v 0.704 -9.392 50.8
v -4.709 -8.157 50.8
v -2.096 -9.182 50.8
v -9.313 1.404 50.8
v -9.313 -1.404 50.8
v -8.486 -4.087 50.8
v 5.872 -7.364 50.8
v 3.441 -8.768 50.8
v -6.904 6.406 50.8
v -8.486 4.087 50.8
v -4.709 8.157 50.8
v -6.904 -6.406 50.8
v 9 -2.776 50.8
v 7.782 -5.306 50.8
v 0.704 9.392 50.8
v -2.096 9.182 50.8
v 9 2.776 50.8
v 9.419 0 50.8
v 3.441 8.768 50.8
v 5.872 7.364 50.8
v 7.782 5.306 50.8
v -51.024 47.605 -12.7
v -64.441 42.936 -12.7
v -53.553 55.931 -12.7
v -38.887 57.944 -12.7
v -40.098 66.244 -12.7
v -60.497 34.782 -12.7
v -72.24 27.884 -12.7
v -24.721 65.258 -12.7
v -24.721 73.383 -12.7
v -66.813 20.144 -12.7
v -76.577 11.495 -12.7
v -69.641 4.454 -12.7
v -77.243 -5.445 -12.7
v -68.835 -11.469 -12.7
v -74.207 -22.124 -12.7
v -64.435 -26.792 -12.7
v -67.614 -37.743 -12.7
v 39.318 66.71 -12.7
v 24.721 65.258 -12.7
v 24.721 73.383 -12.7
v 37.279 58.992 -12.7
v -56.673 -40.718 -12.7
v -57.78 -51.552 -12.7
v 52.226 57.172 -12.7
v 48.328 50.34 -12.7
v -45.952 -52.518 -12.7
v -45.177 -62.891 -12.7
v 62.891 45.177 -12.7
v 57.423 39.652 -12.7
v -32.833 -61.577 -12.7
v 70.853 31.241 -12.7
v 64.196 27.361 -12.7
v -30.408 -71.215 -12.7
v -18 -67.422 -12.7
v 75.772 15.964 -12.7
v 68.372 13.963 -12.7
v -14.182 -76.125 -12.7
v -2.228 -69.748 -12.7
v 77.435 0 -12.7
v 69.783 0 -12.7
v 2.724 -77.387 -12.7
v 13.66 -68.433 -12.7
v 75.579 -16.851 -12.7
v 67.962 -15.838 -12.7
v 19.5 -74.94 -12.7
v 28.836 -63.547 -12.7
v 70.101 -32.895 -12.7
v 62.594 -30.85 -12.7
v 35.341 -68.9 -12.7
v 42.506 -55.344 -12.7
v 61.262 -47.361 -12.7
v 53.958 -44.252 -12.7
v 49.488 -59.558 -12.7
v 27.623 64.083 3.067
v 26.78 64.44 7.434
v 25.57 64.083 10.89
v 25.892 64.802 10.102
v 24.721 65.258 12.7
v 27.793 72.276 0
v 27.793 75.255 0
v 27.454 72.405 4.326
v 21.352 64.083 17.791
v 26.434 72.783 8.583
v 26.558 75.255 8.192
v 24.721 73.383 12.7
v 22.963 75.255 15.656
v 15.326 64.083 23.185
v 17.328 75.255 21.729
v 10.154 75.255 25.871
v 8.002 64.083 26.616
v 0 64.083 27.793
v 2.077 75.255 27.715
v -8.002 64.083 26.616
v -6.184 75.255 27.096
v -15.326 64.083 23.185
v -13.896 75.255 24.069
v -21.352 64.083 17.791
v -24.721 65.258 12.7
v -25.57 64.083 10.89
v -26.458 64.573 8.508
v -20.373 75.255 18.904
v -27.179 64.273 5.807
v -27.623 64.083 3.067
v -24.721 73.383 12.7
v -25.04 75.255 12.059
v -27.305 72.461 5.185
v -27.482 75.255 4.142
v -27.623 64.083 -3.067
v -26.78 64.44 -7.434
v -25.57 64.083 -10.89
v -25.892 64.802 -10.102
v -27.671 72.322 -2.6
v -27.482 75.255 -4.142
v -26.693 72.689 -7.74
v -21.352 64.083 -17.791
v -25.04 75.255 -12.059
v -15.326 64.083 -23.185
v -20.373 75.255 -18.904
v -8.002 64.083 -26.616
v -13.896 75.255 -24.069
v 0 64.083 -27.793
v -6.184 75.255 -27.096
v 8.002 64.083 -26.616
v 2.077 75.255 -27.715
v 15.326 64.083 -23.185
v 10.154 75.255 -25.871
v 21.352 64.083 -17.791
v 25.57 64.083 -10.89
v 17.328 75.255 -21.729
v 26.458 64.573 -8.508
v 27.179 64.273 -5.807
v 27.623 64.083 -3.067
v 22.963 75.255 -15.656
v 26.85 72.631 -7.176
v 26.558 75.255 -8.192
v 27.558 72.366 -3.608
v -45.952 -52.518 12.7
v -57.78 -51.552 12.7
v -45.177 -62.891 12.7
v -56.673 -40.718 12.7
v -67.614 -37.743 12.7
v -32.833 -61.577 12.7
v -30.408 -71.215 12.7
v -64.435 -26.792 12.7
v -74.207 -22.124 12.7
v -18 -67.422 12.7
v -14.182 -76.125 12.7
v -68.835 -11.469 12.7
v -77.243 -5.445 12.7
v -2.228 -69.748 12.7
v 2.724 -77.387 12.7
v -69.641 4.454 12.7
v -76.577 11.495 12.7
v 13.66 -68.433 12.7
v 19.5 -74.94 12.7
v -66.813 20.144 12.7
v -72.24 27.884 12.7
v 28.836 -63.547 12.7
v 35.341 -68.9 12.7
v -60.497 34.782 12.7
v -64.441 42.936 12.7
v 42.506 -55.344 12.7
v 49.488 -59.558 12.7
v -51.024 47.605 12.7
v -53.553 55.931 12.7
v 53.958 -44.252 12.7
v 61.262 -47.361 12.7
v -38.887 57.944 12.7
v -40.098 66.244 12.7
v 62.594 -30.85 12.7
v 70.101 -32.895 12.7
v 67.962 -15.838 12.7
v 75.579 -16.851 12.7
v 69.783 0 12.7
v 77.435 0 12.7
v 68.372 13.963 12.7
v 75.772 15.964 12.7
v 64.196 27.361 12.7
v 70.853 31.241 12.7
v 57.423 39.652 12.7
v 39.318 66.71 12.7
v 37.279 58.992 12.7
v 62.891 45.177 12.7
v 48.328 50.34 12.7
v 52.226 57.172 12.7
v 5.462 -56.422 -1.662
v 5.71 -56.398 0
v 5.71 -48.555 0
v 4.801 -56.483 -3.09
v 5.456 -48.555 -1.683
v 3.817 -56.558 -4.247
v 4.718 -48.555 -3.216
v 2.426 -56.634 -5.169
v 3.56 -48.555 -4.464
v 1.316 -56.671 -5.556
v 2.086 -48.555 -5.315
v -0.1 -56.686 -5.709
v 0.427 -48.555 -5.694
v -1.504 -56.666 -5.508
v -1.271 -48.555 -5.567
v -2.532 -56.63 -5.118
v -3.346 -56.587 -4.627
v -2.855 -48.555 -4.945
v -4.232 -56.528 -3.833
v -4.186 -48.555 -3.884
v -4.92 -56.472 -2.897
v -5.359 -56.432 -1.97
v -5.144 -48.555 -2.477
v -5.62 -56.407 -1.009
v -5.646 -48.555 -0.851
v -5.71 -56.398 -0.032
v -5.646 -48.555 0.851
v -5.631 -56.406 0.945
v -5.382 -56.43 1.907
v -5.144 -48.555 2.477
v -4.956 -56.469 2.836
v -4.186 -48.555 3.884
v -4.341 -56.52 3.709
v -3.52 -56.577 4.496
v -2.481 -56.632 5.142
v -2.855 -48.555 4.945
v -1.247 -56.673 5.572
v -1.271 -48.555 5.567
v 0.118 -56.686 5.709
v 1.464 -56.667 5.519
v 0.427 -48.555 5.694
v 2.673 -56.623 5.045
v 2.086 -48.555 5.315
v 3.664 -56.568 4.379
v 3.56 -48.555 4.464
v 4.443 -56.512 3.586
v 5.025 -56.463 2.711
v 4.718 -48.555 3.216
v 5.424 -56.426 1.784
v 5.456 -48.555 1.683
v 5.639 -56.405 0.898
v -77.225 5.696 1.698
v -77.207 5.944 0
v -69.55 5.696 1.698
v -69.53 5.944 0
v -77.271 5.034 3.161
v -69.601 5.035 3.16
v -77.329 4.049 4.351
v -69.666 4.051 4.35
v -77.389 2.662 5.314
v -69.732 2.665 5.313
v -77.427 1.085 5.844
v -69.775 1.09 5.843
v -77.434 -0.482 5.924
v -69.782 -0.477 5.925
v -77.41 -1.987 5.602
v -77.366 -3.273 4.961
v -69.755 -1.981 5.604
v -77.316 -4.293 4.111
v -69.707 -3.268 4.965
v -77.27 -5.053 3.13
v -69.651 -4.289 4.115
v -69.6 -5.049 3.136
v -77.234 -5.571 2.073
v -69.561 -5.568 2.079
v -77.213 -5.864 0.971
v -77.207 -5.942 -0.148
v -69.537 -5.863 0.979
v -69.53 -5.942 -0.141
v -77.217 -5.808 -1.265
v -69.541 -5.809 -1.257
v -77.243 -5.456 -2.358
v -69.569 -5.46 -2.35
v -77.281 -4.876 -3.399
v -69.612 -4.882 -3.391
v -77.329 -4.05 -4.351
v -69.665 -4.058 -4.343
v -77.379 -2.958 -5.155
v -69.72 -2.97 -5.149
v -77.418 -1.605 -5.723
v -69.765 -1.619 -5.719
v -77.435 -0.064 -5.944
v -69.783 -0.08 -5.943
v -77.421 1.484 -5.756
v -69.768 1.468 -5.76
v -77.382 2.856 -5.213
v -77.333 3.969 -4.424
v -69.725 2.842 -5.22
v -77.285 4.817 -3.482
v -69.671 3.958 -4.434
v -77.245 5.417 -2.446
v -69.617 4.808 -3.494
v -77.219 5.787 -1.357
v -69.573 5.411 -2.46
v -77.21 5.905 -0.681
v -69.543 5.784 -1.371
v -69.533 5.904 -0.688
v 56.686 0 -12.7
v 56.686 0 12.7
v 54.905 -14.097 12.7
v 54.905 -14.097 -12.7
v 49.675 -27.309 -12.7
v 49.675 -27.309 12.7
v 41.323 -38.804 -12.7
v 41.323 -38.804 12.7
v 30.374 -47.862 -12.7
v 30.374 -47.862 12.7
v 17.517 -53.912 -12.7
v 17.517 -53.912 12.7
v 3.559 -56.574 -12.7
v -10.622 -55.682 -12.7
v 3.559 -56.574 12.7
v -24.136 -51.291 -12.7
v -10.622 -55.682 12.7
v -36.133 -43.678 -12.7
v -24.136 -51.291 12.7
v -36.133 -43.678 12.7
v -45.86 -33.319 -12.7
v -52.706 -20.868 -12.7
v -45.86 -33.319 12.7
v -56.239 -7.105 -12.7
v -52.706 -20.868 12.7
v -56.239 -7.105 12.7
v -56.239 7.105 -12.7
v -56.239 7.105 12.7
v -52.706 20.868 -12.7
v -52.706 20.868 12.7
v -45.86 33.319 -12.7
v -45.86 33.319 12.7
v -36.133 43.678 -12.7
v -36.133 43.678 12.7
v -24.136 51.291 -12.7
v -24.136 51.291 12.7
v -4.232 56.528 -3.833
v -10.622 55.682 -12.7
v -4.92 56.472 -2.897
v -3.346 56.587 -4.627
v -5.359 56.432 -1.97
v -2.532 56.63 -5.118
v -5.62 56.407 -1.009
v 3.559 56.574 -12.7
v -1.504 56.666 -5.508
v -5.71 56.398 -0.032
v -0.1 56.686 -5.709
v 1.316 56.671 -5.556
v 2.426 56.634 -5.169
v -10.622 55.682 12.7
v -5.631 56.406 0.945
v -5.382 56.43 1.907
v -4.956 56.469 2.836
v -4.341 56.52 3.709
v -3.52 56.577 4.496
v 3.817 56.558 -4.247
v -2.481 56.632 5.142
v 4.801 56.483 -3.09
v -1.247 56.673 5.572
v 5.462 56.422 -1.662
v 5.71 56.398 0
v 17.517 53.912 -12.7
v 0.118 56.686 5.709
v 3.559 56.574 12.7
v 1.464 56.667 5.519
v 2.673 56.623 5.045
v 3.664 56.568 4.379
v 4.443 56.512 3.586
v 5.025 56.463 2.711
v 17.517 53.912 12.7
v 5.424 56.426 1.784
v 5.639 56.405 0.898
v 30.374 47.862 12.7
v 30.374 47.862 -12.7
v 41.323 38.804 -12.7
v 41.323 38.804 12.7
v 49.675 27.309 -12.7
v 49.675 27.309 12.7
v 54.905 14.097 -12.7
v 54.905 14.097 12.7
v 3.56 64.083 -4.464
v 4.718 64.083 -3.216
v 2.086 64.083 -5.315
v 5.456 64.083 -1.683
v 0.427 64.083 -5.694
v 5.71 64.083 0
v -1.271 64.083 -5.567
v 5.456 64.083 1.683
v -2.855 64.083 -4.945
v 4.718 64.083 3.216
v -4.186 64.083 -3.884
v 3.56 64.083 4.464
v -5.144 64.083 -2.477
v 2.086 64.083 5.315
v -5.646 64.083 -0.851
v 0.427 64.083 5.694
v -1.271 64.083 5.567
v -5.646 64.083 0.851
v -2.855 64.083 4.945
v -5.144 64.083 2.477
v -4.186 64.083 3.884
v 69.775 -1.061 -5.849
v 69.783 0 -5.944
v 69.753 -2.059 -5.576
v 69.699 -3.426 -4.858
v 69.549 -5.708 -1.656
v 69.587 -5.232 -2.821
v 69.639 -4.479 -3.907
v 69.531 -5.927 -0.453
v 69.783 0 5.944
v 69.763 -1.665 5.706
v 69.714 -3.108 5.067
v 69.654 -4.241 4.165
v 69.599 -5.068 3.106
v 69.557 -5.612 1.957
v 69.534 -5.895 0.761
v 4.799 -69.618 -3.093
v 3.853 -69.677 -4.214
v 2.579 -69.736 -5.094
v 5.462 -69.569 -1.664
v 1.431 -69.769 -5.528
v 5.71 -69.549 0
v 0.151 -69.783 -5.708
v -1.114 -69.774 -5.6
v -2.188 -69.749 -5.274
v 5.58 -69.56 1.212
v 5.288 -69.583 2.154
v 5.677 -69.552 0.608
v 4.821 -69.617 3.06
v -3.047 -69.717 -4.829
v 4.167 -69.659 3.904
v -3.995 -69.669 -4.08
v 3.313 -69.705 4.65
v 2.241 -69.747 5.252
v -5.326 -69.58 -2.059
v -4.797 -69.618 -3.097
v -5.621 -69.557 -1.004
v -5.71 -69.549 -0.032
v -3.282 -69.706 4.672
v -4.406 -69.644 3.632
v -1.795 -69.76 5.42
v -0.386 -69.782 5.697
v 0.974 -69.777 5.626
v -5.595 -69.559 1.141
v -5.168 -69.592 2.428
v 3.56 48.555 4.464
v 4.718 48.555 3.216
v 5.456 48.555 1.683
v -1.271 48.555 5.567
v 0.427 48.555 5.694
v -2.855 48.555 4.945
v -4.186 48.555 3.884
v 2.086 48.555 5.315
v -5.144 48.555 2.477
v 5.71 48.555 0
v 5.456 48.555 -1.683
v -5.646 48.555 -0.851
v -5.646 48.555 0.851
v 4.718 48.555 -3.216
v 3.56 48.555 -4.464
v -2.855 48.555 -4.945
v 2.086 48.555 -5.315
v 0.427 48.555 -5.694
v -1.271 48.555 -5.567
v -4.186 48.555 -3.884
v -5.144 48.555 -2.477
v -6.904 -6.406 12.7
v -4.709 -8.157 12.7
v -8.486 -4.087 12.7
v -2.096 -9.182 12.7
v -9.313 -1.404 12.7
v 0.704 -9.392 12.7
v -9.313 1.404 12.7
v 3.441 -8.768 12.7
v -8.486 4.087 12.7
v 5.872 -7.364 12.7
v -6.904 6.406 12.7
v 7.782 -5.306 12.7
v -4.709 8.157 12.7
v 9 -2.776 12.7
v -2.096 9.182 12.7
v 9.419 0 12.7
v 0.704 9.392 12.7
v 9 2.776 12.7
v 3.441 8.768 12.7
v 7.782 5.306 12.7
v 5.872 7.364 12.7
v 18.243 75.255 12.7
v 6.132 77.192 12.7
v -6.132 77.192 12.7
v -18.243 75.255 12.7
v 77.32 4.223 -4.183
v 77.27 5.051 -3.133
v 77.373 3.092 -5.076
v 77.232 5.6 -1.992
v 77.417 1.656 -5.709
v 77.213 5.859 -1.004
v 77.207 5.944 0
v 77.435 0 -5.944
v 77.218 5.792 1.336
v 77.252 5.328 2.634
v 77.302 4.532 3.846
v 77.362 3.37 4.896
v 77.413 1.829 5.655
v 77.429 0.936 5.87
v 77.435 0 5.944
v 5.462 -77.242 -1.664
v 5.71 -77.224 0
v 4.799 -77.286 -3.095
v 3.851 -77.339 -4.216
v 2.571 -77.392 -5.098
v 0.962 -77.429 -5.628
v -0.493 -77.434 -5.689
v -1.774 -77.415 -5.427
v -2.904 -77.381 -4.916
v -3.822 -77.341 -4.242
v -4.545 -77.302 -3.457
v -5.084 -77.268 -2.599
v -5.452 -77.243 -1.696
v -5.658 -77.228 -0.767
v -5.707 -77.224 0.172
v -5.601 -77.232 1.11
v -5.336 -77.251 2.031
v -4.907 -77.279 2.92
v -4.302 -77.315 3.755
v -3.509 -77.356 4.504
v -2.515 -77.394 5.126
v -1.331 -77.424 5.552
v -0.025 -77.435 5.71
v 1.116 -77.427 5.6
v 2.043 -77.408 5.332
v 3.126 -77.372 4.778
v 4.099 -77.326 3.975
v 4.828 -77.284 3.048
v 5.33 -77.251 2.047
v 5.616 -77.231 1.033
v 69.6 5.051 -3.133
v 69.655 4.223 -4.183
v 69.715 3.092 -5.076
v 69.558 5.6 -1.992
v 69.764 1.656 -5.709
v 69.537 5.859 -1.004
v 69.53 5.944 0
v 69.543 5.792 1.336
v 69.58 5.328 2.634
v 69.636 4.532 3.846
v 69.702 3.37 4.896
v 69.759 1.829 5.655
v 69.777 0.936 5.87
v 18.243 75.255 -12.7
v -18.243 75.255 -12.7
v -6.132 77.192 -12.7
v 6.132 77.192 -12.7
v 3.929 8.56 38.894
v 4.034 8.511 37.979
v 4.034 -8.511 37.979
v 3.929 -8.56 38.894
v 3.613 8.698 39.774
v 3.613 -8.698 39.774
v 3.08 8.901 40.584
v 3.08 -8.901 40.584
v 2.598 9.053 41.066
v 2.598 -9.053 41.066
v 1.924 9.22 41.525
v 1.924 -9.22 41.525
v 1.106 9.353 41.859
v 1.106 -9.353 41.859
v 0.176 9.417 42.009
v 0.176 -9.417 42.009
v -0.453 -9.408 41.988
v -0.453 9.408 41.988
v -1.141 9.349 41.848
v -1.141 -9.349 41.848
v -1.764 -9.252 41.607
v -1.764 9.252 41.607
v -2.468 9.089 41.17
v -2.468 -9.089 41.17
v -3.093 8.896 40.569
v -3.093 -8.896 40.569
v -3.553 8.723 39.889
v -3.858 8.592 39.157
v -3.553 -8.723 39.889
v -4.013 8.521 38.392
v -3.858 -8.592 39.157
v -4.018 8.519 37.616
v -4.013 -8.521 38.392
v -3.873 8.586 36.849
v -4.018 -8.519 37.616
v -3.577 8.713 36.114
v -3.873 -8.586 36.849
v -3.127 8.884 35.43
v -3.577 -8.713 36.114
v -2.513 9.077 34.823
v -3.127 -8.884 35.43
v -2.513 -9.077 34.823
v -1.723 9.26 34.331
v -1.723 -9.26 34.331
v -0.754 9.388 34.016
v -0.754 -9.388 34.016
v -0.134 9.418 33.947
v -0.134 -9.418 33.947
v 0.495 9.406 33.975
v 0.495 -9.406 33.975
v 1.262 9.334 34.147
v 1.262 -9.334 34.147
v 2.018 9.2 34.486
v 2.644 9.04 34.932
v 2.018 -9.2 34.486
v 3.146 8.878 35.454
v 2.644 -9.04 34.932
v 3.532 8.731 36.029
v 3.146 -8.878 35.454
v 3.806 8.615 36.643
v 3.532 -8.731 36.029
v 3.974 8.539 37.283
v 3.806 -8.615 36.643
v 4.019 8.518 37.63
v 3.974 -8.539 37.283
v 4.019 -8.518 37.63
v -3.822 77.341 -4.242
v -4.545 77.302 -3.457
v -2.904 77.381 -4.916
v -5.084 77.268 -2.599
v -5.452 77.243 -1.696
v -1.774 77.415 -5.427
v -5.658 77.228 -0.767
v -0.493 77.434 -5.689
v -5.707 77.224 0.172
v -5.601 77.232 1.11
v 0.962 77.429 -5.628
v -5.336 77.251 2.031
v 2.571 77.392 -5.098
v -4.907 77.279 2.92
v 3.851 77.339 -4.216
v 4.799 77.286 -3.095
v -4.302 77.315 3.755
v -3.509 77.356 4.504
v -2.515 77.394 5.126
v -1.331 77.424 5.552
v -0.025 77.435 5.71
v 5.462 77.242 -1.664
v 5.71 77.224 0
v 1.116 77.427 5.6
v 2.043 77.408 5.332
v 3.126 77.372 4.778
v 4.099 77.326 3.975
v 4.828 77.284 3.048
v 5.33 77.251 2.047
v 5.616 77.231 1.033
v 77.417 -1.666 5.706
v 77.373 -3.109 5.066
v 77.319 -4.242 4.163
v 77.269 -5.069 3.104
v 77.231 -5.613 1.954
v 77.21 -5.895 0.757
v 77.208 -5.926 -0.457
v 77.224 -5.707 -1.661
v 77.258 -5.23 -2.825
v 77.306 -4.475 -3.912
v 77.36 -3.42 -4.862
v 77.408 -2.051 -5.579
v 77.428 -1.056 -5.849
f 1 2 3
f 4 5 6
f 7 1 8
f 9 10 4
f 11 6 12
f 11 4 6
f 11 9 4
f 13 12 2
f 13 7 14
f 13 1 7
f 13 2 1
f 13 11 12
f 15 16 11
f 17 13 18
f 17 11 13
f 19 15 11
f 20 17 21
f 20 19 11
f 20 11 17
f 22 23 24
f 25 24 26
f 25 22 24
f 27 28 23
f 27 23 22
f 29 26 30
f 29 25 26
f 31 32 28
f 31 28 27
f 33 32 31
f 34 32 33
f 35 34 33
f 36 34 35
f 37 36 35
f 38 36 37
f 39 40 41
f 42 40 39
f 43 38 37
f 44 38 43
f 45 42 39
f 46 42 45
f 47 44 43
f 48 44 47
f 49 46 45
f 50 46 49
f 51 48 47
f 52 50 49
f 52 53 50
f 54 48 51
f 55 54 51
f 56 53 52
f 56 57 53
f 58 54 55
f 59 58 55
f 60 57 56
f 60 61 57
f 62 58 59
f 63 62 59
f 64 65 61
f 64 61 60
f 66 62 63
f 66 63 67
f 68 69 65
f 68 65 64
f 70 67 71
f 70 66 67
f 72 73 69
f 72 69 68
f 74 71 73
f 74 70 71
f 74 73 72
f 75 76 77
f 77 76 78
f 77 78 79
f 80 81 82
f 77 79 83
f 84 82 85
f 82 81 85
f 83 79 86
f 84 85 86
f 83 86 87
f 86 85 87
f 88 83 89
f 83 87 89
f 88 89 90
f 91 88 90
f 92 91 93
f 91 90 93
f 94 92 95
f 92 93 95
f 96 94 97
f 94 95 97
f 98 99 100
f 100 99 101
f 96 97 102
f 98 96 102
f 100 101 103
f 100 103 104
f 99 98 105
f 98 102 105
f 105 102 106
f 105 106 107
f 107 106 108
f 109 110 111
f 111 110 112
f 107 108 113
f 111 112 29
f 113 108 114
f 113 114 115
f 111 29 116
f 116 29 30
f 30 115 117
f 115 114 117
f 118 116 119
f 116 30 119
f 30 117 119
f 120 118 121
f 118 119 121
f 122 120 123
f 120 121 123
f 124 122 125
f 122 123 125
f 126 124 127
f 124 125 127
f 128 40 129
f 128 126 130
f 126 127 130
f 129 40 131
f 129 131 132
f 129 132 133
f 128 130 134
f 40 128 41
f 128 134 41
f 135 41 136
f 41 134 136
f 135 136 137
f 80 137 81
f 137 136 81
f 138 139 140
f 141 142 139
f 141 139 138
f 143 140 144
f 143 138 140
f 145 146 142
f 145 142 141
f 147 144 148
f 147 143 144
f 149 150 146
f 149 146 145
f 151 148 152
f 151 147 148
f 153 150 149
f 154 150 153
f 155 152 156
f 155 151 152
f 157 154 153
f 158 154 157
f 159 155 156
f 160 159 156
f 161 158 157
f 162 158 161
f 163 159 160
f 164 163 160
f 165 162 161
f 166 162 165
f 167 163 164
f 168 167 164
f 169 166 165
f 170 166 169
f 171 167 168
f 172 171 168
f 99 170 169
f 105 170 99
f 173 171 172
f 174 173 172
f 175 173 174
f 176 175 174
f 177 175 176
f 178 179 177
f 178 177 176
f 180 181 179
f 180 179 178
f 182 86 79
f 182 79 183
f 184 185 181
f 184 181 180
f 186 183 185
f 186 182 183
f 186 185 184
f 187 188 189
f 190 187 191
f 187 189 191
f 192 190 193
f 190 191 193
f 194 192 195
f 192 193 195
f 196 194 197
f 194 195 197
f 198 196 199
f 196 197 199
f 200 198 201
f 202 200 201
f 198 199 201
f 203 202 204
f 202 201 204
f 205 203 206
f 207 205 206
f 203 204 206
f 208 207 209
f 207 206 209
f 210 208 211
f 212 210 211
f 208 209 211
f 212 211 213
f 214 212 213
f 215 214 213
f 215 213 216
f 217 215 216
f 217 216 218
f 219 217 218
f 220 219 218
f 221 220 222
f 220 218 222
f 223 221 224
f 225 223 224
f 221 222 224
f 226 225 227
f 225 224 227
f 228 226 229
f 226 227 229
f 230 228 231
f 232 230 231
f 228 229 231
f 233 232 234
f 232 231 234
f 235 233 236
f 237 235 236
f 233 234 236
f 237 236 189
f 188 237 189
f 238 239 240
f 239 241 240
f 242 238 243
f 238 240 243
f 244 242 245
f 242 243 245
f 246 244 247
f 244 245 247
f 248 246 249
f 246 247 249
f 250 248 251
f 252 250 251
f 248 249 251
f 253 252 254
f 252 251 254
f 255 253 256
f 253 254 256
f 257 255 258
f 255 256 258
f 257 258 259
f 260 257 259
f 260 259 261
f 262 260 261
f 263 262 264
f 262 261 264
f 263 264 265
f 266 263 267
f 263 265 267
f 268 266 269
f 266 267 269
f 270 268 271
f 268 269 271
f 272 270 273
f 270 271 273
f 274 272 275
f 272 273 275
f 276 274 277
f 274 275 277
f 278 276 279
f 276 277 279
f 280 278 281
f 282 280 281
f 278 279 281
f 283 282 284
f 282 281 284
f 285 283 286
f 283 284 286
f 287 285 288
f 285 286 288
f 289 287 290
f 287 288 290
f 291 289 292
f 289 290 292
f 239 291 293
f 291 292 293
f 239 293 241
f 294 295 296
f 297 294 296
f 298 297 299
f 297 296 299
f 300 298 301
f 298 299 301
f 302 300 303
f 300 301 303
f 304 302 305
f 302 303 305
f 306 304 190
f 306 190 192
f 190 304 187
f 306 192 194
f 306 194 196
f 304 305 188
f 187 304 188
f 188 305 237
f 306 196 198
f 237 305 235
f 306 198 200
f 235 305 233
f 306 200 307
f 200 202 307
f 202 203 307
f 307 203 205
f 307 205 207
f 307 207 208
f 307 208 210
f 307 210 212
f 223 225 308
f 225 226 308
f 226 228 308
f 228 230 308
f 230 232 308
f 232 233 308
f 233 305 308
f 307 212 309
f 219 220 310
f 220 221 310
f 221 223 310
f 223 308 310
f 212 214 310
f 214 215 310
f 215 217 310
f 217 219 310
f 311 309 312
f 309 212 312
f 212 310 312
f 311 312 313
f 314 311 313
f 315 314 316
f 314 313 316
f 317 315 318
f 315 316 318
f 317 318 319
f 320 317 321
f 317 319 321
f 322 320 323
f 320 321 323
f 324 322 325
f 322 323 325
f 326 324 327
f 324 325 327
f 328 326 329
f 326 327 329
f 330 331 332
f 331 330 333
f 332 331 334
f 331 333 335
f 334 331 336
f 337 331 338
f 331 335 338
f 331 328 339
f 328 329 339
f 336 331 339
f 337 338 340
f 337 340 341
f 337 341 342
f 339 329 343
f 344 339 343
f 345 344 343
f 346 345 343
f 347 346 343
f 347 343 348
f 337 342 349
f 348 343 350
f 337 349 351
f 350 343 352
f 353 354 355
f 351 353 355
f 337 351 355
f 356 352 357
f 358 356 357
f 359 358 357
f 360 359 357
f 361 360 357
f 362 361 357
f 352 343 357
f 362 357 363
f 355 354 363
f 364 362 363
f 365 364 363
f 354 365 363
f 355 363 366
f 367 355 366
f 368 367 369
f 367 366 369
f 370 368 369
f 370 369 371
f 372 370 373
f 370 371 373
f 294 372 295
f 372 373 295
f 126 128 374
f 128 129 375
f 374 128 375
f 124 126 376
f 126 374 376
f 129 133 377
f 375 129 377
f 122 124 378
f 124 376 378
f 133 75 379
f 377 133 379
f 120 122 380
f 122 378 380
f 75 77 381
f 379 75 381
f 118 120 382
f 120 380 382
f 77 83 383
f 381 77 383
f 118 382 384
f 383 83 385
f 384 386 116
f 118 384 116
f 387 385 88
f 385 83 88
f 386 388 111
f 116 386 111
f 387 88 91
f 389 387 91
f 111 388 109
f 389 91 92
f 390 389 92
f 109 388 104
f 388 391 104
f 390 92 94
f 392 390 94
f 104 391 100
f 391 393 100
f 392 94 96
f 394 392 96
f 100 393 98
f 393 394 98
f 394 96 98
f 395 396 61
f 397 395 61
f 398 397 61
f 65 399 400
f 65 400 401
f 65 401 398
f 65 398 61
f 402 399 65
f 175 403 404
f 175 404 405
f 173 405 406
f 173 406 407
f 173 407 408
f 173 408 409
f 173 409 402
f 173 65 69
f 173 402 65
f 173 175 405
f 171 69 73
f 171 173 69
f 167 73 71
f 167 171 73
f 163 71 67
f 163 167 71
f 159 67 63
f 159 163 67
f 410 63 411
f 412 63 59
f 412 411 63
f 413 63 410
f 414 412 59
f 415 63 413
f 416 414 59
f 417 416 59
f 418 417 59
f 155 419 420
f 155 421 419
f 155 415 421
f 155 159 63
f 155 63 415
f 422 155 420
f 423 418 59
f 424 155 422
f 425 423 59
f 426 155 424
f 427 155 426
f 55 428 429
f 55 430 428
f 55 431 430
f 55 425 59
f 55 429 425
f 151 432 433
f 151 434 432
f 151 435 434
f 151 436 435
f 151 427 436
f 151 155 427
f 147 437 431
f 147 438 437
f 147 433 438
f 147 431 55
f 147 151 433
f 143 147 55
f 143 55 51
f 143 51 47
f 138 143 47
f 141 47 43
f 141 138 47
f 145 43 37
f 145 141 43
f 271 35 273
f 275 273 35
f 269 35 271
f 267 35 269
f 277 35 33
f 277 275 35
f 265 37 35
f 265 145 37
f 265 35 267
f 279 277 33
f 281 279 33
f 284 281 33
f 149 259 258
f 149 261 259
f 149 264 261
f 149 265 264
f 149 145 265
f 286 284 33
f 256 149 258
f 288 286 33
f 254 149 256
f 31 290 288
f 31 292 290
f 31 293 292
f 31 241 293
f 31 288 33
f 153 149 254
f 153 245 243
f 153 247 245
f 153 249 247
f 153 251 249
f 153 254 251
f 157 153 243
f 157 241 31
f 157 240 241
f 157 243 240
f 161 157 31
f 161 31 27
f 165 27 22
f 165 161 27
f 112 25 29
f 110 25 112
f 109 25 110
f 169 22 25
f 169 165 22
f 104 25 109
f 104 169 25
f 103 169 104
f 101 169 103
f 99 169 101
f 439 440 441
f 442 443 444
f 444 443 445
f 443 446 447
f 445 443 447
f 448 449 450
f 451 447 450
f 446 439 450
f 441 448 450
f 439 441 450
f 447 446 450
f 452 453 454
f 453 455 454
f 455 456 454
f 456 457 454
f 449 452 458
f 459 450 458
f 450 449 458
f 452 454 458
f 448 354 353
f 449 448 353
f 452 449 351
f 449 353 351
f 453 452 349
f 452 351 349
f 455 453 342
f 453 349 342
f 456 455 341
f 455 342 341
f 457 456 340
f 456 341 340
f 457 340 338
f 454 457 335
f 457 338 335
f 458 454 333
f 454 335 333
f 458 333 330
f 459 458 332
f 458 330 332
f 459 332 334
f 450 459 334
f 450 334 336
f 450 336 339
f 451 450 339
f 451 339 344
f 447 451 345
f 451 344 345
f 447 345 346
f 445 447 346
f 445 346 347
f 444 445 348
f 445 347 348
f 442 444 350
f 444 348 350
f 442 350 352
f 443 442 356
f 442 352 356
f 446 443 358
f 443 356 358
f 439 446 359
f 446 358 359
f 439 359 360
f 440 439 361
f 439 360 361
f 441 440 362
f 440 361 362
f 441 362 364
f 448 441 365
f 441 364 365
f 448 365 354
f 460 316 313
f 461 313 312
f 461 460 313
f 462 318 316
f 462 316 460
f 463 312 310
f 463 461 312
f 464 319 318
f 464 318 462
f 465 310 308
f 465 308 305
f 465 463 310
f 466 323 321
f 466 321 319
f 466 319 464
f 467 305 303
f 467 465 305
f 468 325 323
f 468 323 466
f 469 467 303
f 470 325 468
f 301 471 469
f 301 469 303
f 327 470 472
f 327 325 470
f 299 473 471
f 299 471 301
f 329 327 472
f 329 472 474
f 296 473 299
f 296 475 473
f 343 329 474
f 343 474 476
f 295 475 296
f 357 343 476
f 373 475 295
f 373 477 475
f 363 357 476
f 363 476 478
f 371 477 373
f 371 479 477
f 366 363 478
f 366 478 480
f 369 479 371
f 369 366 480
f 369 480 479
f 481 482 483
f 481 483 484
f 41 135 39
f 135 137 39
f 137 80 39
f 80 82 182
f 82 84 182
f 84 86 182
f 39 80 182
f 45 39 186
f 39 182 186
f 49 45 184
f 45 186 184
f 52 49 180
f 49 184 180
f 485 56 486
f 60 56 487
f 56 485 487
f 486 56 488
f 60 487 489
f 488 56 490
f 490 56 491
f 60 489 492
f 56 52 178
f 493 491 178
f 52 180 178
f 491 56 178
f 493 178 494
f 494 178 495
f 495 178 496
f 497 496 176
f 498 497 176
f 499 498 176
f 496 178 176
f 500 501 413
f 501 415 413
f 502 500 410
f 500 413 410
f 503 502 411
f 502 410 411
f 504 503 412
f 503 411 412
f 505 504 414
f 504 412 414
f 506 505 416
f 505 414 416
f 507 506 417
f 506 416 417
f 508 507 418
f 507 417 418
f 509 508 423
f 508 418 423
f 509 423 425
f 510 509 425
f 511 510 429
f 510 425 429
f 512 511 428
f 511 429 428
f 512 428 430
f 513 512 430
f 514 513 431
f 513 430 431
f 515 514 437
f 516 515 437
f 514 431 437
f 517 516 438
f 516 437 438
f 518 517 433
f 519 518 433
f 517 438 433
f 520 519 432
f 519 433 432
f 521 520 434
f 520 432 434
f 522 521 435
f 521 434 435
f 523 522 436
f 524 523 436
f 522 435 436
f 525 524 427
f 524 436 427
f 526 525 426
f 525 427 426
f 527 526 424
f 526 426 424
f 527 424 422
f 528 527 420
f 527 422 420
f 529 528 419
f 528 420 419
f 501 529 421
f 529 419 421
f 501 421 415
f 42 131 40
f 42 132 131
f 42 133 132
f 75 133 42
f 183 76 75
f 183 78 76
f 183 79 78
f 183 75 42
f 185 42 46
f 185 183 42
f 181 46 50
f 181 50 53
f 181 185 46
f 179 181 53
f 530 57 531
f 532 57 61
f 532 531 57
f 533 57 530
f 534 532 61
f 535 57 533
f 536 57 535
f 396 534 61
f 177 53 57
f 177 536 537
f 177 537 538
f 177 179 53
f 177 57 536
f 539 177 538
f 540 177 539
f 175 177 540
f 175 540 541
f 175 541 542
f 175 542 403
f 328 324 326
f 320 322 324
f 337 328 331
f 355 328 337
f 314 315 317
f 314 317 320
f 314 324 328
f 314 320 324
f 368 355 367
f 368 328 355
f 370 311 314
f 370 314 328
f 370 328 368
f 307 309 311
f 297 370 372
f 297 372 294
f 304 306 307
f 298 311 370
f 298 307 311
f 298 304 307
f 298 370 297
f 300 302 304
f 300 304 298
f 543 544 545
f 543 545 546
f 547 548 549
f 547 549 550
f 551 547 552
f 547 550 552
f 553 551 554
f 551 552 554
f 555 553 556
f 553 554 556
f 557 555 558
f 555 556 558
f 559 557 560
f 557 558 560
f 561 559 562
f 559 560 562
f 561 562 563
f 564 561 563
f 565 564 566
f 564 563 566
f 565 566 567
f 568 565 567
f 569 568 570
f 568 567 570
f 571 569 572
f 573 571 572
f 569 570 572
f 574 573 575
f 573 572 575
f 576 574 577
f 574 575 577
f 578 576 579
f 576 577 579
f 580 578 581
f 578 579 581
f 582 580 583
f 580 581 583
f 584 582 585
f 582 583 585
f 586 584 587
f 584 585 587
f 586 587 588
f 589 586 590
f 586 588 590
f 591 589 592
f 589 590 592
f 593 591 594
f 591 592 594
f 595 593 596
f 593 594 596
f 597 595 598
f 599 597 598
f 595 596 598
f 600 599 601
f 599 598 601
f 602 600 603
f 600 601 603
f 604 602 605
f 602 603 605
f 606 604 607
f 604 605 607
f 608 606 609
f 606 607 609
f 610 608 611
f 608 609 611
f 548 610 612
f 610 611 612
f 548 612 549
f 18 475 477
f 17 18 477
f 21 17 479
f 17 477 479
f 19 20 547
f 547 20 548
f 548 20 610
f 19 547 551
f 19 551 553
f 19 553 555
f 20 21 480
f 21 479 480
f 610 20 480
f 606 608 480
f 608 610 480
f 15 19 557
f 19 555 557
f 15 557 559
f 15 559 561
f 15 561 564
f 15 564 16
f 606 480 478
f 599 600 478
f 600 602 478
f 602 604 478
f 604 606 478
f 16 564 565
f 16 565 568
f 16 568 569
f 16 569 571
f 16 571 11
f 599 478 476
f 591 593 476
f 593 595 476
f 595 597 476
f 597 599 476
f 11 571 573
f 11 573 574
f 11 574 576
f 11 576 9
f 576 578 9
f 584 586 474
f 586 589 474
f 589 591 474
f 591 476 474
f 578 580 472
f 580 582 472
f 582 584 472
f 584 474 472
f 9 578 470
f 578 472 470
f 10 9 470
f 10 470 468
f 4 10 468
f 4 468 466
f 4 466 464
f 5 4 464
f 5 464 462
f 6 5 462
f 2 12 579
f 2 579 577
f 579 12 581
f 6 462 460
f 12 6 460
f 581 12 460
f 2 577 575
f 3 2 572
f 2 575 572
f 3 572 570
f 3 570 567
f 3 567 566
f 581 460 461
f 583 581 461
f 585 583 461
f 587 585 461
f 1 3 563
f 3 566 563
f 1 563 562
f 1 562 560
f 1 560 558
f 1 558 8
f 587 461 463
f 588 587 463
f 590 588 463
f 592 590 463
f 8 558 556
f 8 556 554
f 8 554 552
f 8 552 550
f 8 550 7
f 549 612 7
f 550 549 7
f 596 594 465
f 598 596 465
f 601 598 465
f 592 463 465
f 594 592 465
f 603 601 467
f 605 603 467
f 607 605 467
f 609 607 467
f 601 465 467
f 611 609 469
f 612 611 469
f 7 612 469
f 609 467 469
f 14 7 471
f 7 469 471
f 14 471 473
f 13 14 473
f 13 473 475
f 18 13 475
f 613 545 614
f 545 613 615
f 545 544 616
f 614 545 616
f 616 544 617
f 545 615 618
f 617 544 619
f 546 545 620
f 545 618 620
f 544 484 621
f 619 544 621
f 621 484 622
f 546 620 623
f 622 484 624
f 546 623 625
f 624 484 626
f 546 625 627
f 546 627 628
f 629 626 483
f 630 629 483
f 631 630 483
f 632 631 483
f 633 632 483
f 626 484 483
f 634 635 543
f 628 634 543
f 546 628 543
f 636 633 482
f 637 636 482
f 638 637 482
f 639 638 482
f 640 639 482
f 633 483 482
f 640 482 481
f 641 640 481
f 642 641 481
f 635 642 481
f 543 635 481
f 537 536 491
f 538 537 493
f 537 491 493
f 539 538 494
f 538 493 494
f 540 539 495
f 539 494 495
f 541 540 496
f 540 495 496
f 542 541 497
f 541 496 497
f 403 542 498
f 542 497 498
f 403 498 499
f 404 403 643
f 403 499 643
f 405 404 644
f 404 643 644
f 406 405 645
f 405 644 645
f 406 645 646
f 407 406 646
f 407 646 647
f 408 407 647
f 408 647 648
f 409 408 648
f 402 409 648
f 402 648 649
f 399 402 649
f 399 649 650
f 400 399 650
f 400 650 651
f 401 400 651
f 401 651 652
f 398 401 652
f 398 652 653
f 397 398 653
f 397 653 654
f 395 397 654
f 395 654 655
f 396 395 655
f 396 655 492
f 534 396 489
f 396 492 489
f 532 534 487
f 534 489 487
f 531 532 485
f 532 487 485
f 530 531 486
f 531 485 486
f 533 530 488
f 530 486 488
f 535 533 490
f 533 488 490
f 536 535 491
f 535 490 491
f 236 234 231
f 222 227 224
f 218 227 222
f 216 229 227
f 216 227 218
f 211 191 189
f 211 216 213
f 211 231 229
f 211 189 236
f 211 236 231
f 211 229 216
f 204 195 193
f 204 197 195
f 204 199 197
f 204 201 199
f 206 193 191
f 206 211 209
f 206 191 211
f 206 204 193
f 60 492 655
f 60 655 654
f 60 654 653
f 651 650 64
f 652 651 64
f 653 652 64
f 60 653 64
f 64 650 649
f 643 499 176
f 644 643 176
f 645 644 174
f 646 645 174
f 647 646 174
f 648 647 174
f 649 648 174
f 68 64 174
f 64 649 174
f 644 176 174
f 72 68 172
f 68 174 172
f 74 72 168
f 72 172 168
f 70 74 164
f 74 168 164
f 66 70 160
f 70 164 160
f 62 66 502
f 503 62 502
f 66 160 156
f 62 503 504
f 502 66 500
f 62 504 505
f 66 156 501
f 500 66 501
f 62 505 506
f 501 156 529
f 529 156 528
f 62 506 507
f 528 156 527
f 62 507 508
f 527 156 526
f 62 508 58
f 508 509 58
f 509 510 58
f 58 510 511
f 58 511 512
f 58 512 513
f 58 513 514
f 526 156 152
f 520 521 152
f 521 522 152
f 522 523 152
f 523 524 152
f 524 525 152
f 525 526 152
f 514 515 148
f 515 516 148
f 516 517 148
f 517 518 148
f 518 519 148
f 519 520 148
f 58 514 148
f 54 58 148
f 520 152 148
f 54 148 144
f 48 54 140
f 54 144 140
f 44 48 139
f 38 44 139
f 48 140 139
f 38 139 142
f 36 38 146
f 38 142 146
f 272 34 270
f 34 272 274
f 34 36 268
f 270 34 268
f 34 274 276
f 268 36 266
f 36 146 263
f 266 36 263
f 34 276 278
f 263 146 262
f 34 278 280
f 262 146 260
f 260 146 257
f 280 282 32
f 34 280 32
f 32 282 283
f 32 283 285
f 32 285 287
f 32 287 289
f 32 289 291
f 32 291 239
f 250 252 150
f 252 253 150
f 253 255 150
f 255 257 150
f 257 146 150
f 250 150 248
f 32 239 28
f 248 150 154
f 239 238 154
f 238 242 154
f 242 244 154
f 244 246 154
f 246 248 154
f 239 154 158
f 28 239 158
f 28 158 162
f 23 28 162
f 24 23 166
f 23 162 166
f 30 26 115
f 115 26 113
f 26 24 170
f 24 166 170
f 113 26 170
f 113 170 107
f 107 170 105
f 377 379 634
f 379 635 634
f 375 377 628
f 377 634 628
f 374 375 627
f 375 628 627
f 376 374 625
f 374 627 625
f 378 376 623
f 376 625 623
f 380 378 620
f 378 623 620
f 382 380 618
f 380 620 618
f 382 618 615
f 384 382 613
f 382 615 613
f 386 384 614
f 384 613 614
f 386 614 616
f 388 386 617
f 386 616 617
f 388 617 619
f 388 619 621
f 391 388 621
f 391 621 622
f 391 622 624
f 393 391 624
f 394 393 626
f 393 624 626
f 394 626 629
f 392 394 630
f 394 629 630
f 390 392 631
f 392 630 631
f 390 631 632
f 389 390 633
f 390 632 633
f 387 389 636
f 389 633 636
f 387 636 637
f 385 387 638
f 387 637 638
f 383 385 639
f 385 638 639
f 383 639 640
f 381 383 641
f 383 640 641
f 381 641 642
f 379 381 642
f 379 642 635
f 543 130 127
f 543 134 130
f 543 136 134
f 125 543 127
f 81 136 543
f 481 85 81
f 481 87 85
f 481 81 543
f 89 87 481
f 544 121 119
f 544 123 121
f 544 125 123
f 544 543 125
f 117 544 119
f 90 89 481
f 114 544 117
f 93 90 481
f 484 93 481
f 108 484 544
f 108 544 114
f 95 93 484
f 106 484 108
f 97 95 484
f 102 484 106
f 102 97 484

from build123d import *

# Parameters (mm, degrees)
F0_R           = 77.4350714905
F0_R_2         = 69.7833431062
F1_DEPTH       = 12.7
F0_R_3         = 56.6862794468
F1_FACE_R      = 77.4350714905
F1_FACE_R_2    = 69.7833431062
F1_FACE_R_3    = 56.6862794468
F1_FACE1_R     = 77.4350714905
F1_FACE1_R_2   = 69.7833431062
F3_DEPTH       = 12.7
F2_W           = 10.581061244
F2_H           = 5.9439064935
F5_W           = 27.7926959097
F5_H           = 11.1719220877
F7_W           = 5.7097924873
F7_H           = 30.5841192603
F9_R           = 9.4185866686
F10_DEPTH      = 50.8
F11_R          = 4.0341501012
F12_DEPTH      = 12.7
F12_DEPTH_BACK = 12.7


with BuildPart() as f1:
    # F0 (on Top) → F1 (new body)
    with BuildSketch(Plane.XY):
        Circle(F0_R)
        Circle(F0_R_2, mode=Mode.SUBTRACT)
    extrude(amount=F1_DEPTH)



with BuildPart() as f1b:
    # F0 (on Top) → F1, piece 2 (new body)
    with BuildSketch(Plane.XY):
        Circle(F0_R_3)
    extrude(amount=F1_DEPTH)


with BuildPart() as f1_1:
    add(f1.part)

    add(f1b.part)  # F3 merges F1b
    # F1_face (on face) + F1_face1 (on face) → F3 (join)
    with BuildSketch(Plane(origin=(0, 0, 0), x_dir=(1, 0, 0), z_dir=(0, 0, -1))):
        Circle(F1_FACE_R)
        Circle(F1_FACE_R_2, mode=Mode.SUBTRACT)
        Circle(F1_FACE_R_3)
    with BuildSketch(Plane.XY.offset(12.7)):
        Circle(F1_FACE1_R)
        Circle(F1_FACE1_R_2, mode=Mode.SUBTRACT)
    extrude(amount=F3_DEPTH, dir=(0, 0, -1))

    # F2 (on Top) → F4 (revolve, cut)
    with BuildSketch(Plane.XY):
        with Locations((-73.9312767982, 2.9719532467)):
            Rectangle(F2_W, F2_H)
        with Locations((73.9312767982, 2.9719532467)):
            Rectangle(F2_W, F2_H)
    revolve(axis=Axis((-73.9312767982, 0, 0), (1, 0, 0)), mode=Mode.SUBTRACT)

    # F5 (on Top) → F6 (revolve)
    with BuildSketch(Plane.XY):
        with Locations((13.8963479549, 69.6693956852)):
            Rectangle(F5_W, F5_H)
    revolve(axis=Axis((0, 69.6693956852, 0), (0, -1, 0)))

    # F7 (on Top) → F8 (revolve, cut)
    with BuildSketch(Plane.XY):
        with Locations((2.8548962437, 63.8469867408)):
            Rectangle(F7_W, F7_H)
        with Locations((2.8548962437, -63.8469867408)):
            Rectangle(F7_W, F7_H)
    revolve(axis=Axis((0, 63.8469867408, 0), (0, 1, 0)), mode=Mode.SUBTRACT)

    # F9 (on Top) → F10 (join)
    with BuildSketch(Plane.XY):
        Circle(F9_R)
    extrude(amount=F10_DEPTH)

    # F11 (on Front) → F12 (cut, two sides)
    with BuildSketch(Plane.XZ) as f12_sk:
        with Locations((0, 37.9789620638)):
            Circle(F11_R)
    extrude(amount=F12_DEPTH, mode=Mode.SUBTRACT)
    extrude(f12_sk.sketch, amount=-F12_DEPTH_BACK, mode=Mode.SUBTRACT)


solid = f1_1.part
